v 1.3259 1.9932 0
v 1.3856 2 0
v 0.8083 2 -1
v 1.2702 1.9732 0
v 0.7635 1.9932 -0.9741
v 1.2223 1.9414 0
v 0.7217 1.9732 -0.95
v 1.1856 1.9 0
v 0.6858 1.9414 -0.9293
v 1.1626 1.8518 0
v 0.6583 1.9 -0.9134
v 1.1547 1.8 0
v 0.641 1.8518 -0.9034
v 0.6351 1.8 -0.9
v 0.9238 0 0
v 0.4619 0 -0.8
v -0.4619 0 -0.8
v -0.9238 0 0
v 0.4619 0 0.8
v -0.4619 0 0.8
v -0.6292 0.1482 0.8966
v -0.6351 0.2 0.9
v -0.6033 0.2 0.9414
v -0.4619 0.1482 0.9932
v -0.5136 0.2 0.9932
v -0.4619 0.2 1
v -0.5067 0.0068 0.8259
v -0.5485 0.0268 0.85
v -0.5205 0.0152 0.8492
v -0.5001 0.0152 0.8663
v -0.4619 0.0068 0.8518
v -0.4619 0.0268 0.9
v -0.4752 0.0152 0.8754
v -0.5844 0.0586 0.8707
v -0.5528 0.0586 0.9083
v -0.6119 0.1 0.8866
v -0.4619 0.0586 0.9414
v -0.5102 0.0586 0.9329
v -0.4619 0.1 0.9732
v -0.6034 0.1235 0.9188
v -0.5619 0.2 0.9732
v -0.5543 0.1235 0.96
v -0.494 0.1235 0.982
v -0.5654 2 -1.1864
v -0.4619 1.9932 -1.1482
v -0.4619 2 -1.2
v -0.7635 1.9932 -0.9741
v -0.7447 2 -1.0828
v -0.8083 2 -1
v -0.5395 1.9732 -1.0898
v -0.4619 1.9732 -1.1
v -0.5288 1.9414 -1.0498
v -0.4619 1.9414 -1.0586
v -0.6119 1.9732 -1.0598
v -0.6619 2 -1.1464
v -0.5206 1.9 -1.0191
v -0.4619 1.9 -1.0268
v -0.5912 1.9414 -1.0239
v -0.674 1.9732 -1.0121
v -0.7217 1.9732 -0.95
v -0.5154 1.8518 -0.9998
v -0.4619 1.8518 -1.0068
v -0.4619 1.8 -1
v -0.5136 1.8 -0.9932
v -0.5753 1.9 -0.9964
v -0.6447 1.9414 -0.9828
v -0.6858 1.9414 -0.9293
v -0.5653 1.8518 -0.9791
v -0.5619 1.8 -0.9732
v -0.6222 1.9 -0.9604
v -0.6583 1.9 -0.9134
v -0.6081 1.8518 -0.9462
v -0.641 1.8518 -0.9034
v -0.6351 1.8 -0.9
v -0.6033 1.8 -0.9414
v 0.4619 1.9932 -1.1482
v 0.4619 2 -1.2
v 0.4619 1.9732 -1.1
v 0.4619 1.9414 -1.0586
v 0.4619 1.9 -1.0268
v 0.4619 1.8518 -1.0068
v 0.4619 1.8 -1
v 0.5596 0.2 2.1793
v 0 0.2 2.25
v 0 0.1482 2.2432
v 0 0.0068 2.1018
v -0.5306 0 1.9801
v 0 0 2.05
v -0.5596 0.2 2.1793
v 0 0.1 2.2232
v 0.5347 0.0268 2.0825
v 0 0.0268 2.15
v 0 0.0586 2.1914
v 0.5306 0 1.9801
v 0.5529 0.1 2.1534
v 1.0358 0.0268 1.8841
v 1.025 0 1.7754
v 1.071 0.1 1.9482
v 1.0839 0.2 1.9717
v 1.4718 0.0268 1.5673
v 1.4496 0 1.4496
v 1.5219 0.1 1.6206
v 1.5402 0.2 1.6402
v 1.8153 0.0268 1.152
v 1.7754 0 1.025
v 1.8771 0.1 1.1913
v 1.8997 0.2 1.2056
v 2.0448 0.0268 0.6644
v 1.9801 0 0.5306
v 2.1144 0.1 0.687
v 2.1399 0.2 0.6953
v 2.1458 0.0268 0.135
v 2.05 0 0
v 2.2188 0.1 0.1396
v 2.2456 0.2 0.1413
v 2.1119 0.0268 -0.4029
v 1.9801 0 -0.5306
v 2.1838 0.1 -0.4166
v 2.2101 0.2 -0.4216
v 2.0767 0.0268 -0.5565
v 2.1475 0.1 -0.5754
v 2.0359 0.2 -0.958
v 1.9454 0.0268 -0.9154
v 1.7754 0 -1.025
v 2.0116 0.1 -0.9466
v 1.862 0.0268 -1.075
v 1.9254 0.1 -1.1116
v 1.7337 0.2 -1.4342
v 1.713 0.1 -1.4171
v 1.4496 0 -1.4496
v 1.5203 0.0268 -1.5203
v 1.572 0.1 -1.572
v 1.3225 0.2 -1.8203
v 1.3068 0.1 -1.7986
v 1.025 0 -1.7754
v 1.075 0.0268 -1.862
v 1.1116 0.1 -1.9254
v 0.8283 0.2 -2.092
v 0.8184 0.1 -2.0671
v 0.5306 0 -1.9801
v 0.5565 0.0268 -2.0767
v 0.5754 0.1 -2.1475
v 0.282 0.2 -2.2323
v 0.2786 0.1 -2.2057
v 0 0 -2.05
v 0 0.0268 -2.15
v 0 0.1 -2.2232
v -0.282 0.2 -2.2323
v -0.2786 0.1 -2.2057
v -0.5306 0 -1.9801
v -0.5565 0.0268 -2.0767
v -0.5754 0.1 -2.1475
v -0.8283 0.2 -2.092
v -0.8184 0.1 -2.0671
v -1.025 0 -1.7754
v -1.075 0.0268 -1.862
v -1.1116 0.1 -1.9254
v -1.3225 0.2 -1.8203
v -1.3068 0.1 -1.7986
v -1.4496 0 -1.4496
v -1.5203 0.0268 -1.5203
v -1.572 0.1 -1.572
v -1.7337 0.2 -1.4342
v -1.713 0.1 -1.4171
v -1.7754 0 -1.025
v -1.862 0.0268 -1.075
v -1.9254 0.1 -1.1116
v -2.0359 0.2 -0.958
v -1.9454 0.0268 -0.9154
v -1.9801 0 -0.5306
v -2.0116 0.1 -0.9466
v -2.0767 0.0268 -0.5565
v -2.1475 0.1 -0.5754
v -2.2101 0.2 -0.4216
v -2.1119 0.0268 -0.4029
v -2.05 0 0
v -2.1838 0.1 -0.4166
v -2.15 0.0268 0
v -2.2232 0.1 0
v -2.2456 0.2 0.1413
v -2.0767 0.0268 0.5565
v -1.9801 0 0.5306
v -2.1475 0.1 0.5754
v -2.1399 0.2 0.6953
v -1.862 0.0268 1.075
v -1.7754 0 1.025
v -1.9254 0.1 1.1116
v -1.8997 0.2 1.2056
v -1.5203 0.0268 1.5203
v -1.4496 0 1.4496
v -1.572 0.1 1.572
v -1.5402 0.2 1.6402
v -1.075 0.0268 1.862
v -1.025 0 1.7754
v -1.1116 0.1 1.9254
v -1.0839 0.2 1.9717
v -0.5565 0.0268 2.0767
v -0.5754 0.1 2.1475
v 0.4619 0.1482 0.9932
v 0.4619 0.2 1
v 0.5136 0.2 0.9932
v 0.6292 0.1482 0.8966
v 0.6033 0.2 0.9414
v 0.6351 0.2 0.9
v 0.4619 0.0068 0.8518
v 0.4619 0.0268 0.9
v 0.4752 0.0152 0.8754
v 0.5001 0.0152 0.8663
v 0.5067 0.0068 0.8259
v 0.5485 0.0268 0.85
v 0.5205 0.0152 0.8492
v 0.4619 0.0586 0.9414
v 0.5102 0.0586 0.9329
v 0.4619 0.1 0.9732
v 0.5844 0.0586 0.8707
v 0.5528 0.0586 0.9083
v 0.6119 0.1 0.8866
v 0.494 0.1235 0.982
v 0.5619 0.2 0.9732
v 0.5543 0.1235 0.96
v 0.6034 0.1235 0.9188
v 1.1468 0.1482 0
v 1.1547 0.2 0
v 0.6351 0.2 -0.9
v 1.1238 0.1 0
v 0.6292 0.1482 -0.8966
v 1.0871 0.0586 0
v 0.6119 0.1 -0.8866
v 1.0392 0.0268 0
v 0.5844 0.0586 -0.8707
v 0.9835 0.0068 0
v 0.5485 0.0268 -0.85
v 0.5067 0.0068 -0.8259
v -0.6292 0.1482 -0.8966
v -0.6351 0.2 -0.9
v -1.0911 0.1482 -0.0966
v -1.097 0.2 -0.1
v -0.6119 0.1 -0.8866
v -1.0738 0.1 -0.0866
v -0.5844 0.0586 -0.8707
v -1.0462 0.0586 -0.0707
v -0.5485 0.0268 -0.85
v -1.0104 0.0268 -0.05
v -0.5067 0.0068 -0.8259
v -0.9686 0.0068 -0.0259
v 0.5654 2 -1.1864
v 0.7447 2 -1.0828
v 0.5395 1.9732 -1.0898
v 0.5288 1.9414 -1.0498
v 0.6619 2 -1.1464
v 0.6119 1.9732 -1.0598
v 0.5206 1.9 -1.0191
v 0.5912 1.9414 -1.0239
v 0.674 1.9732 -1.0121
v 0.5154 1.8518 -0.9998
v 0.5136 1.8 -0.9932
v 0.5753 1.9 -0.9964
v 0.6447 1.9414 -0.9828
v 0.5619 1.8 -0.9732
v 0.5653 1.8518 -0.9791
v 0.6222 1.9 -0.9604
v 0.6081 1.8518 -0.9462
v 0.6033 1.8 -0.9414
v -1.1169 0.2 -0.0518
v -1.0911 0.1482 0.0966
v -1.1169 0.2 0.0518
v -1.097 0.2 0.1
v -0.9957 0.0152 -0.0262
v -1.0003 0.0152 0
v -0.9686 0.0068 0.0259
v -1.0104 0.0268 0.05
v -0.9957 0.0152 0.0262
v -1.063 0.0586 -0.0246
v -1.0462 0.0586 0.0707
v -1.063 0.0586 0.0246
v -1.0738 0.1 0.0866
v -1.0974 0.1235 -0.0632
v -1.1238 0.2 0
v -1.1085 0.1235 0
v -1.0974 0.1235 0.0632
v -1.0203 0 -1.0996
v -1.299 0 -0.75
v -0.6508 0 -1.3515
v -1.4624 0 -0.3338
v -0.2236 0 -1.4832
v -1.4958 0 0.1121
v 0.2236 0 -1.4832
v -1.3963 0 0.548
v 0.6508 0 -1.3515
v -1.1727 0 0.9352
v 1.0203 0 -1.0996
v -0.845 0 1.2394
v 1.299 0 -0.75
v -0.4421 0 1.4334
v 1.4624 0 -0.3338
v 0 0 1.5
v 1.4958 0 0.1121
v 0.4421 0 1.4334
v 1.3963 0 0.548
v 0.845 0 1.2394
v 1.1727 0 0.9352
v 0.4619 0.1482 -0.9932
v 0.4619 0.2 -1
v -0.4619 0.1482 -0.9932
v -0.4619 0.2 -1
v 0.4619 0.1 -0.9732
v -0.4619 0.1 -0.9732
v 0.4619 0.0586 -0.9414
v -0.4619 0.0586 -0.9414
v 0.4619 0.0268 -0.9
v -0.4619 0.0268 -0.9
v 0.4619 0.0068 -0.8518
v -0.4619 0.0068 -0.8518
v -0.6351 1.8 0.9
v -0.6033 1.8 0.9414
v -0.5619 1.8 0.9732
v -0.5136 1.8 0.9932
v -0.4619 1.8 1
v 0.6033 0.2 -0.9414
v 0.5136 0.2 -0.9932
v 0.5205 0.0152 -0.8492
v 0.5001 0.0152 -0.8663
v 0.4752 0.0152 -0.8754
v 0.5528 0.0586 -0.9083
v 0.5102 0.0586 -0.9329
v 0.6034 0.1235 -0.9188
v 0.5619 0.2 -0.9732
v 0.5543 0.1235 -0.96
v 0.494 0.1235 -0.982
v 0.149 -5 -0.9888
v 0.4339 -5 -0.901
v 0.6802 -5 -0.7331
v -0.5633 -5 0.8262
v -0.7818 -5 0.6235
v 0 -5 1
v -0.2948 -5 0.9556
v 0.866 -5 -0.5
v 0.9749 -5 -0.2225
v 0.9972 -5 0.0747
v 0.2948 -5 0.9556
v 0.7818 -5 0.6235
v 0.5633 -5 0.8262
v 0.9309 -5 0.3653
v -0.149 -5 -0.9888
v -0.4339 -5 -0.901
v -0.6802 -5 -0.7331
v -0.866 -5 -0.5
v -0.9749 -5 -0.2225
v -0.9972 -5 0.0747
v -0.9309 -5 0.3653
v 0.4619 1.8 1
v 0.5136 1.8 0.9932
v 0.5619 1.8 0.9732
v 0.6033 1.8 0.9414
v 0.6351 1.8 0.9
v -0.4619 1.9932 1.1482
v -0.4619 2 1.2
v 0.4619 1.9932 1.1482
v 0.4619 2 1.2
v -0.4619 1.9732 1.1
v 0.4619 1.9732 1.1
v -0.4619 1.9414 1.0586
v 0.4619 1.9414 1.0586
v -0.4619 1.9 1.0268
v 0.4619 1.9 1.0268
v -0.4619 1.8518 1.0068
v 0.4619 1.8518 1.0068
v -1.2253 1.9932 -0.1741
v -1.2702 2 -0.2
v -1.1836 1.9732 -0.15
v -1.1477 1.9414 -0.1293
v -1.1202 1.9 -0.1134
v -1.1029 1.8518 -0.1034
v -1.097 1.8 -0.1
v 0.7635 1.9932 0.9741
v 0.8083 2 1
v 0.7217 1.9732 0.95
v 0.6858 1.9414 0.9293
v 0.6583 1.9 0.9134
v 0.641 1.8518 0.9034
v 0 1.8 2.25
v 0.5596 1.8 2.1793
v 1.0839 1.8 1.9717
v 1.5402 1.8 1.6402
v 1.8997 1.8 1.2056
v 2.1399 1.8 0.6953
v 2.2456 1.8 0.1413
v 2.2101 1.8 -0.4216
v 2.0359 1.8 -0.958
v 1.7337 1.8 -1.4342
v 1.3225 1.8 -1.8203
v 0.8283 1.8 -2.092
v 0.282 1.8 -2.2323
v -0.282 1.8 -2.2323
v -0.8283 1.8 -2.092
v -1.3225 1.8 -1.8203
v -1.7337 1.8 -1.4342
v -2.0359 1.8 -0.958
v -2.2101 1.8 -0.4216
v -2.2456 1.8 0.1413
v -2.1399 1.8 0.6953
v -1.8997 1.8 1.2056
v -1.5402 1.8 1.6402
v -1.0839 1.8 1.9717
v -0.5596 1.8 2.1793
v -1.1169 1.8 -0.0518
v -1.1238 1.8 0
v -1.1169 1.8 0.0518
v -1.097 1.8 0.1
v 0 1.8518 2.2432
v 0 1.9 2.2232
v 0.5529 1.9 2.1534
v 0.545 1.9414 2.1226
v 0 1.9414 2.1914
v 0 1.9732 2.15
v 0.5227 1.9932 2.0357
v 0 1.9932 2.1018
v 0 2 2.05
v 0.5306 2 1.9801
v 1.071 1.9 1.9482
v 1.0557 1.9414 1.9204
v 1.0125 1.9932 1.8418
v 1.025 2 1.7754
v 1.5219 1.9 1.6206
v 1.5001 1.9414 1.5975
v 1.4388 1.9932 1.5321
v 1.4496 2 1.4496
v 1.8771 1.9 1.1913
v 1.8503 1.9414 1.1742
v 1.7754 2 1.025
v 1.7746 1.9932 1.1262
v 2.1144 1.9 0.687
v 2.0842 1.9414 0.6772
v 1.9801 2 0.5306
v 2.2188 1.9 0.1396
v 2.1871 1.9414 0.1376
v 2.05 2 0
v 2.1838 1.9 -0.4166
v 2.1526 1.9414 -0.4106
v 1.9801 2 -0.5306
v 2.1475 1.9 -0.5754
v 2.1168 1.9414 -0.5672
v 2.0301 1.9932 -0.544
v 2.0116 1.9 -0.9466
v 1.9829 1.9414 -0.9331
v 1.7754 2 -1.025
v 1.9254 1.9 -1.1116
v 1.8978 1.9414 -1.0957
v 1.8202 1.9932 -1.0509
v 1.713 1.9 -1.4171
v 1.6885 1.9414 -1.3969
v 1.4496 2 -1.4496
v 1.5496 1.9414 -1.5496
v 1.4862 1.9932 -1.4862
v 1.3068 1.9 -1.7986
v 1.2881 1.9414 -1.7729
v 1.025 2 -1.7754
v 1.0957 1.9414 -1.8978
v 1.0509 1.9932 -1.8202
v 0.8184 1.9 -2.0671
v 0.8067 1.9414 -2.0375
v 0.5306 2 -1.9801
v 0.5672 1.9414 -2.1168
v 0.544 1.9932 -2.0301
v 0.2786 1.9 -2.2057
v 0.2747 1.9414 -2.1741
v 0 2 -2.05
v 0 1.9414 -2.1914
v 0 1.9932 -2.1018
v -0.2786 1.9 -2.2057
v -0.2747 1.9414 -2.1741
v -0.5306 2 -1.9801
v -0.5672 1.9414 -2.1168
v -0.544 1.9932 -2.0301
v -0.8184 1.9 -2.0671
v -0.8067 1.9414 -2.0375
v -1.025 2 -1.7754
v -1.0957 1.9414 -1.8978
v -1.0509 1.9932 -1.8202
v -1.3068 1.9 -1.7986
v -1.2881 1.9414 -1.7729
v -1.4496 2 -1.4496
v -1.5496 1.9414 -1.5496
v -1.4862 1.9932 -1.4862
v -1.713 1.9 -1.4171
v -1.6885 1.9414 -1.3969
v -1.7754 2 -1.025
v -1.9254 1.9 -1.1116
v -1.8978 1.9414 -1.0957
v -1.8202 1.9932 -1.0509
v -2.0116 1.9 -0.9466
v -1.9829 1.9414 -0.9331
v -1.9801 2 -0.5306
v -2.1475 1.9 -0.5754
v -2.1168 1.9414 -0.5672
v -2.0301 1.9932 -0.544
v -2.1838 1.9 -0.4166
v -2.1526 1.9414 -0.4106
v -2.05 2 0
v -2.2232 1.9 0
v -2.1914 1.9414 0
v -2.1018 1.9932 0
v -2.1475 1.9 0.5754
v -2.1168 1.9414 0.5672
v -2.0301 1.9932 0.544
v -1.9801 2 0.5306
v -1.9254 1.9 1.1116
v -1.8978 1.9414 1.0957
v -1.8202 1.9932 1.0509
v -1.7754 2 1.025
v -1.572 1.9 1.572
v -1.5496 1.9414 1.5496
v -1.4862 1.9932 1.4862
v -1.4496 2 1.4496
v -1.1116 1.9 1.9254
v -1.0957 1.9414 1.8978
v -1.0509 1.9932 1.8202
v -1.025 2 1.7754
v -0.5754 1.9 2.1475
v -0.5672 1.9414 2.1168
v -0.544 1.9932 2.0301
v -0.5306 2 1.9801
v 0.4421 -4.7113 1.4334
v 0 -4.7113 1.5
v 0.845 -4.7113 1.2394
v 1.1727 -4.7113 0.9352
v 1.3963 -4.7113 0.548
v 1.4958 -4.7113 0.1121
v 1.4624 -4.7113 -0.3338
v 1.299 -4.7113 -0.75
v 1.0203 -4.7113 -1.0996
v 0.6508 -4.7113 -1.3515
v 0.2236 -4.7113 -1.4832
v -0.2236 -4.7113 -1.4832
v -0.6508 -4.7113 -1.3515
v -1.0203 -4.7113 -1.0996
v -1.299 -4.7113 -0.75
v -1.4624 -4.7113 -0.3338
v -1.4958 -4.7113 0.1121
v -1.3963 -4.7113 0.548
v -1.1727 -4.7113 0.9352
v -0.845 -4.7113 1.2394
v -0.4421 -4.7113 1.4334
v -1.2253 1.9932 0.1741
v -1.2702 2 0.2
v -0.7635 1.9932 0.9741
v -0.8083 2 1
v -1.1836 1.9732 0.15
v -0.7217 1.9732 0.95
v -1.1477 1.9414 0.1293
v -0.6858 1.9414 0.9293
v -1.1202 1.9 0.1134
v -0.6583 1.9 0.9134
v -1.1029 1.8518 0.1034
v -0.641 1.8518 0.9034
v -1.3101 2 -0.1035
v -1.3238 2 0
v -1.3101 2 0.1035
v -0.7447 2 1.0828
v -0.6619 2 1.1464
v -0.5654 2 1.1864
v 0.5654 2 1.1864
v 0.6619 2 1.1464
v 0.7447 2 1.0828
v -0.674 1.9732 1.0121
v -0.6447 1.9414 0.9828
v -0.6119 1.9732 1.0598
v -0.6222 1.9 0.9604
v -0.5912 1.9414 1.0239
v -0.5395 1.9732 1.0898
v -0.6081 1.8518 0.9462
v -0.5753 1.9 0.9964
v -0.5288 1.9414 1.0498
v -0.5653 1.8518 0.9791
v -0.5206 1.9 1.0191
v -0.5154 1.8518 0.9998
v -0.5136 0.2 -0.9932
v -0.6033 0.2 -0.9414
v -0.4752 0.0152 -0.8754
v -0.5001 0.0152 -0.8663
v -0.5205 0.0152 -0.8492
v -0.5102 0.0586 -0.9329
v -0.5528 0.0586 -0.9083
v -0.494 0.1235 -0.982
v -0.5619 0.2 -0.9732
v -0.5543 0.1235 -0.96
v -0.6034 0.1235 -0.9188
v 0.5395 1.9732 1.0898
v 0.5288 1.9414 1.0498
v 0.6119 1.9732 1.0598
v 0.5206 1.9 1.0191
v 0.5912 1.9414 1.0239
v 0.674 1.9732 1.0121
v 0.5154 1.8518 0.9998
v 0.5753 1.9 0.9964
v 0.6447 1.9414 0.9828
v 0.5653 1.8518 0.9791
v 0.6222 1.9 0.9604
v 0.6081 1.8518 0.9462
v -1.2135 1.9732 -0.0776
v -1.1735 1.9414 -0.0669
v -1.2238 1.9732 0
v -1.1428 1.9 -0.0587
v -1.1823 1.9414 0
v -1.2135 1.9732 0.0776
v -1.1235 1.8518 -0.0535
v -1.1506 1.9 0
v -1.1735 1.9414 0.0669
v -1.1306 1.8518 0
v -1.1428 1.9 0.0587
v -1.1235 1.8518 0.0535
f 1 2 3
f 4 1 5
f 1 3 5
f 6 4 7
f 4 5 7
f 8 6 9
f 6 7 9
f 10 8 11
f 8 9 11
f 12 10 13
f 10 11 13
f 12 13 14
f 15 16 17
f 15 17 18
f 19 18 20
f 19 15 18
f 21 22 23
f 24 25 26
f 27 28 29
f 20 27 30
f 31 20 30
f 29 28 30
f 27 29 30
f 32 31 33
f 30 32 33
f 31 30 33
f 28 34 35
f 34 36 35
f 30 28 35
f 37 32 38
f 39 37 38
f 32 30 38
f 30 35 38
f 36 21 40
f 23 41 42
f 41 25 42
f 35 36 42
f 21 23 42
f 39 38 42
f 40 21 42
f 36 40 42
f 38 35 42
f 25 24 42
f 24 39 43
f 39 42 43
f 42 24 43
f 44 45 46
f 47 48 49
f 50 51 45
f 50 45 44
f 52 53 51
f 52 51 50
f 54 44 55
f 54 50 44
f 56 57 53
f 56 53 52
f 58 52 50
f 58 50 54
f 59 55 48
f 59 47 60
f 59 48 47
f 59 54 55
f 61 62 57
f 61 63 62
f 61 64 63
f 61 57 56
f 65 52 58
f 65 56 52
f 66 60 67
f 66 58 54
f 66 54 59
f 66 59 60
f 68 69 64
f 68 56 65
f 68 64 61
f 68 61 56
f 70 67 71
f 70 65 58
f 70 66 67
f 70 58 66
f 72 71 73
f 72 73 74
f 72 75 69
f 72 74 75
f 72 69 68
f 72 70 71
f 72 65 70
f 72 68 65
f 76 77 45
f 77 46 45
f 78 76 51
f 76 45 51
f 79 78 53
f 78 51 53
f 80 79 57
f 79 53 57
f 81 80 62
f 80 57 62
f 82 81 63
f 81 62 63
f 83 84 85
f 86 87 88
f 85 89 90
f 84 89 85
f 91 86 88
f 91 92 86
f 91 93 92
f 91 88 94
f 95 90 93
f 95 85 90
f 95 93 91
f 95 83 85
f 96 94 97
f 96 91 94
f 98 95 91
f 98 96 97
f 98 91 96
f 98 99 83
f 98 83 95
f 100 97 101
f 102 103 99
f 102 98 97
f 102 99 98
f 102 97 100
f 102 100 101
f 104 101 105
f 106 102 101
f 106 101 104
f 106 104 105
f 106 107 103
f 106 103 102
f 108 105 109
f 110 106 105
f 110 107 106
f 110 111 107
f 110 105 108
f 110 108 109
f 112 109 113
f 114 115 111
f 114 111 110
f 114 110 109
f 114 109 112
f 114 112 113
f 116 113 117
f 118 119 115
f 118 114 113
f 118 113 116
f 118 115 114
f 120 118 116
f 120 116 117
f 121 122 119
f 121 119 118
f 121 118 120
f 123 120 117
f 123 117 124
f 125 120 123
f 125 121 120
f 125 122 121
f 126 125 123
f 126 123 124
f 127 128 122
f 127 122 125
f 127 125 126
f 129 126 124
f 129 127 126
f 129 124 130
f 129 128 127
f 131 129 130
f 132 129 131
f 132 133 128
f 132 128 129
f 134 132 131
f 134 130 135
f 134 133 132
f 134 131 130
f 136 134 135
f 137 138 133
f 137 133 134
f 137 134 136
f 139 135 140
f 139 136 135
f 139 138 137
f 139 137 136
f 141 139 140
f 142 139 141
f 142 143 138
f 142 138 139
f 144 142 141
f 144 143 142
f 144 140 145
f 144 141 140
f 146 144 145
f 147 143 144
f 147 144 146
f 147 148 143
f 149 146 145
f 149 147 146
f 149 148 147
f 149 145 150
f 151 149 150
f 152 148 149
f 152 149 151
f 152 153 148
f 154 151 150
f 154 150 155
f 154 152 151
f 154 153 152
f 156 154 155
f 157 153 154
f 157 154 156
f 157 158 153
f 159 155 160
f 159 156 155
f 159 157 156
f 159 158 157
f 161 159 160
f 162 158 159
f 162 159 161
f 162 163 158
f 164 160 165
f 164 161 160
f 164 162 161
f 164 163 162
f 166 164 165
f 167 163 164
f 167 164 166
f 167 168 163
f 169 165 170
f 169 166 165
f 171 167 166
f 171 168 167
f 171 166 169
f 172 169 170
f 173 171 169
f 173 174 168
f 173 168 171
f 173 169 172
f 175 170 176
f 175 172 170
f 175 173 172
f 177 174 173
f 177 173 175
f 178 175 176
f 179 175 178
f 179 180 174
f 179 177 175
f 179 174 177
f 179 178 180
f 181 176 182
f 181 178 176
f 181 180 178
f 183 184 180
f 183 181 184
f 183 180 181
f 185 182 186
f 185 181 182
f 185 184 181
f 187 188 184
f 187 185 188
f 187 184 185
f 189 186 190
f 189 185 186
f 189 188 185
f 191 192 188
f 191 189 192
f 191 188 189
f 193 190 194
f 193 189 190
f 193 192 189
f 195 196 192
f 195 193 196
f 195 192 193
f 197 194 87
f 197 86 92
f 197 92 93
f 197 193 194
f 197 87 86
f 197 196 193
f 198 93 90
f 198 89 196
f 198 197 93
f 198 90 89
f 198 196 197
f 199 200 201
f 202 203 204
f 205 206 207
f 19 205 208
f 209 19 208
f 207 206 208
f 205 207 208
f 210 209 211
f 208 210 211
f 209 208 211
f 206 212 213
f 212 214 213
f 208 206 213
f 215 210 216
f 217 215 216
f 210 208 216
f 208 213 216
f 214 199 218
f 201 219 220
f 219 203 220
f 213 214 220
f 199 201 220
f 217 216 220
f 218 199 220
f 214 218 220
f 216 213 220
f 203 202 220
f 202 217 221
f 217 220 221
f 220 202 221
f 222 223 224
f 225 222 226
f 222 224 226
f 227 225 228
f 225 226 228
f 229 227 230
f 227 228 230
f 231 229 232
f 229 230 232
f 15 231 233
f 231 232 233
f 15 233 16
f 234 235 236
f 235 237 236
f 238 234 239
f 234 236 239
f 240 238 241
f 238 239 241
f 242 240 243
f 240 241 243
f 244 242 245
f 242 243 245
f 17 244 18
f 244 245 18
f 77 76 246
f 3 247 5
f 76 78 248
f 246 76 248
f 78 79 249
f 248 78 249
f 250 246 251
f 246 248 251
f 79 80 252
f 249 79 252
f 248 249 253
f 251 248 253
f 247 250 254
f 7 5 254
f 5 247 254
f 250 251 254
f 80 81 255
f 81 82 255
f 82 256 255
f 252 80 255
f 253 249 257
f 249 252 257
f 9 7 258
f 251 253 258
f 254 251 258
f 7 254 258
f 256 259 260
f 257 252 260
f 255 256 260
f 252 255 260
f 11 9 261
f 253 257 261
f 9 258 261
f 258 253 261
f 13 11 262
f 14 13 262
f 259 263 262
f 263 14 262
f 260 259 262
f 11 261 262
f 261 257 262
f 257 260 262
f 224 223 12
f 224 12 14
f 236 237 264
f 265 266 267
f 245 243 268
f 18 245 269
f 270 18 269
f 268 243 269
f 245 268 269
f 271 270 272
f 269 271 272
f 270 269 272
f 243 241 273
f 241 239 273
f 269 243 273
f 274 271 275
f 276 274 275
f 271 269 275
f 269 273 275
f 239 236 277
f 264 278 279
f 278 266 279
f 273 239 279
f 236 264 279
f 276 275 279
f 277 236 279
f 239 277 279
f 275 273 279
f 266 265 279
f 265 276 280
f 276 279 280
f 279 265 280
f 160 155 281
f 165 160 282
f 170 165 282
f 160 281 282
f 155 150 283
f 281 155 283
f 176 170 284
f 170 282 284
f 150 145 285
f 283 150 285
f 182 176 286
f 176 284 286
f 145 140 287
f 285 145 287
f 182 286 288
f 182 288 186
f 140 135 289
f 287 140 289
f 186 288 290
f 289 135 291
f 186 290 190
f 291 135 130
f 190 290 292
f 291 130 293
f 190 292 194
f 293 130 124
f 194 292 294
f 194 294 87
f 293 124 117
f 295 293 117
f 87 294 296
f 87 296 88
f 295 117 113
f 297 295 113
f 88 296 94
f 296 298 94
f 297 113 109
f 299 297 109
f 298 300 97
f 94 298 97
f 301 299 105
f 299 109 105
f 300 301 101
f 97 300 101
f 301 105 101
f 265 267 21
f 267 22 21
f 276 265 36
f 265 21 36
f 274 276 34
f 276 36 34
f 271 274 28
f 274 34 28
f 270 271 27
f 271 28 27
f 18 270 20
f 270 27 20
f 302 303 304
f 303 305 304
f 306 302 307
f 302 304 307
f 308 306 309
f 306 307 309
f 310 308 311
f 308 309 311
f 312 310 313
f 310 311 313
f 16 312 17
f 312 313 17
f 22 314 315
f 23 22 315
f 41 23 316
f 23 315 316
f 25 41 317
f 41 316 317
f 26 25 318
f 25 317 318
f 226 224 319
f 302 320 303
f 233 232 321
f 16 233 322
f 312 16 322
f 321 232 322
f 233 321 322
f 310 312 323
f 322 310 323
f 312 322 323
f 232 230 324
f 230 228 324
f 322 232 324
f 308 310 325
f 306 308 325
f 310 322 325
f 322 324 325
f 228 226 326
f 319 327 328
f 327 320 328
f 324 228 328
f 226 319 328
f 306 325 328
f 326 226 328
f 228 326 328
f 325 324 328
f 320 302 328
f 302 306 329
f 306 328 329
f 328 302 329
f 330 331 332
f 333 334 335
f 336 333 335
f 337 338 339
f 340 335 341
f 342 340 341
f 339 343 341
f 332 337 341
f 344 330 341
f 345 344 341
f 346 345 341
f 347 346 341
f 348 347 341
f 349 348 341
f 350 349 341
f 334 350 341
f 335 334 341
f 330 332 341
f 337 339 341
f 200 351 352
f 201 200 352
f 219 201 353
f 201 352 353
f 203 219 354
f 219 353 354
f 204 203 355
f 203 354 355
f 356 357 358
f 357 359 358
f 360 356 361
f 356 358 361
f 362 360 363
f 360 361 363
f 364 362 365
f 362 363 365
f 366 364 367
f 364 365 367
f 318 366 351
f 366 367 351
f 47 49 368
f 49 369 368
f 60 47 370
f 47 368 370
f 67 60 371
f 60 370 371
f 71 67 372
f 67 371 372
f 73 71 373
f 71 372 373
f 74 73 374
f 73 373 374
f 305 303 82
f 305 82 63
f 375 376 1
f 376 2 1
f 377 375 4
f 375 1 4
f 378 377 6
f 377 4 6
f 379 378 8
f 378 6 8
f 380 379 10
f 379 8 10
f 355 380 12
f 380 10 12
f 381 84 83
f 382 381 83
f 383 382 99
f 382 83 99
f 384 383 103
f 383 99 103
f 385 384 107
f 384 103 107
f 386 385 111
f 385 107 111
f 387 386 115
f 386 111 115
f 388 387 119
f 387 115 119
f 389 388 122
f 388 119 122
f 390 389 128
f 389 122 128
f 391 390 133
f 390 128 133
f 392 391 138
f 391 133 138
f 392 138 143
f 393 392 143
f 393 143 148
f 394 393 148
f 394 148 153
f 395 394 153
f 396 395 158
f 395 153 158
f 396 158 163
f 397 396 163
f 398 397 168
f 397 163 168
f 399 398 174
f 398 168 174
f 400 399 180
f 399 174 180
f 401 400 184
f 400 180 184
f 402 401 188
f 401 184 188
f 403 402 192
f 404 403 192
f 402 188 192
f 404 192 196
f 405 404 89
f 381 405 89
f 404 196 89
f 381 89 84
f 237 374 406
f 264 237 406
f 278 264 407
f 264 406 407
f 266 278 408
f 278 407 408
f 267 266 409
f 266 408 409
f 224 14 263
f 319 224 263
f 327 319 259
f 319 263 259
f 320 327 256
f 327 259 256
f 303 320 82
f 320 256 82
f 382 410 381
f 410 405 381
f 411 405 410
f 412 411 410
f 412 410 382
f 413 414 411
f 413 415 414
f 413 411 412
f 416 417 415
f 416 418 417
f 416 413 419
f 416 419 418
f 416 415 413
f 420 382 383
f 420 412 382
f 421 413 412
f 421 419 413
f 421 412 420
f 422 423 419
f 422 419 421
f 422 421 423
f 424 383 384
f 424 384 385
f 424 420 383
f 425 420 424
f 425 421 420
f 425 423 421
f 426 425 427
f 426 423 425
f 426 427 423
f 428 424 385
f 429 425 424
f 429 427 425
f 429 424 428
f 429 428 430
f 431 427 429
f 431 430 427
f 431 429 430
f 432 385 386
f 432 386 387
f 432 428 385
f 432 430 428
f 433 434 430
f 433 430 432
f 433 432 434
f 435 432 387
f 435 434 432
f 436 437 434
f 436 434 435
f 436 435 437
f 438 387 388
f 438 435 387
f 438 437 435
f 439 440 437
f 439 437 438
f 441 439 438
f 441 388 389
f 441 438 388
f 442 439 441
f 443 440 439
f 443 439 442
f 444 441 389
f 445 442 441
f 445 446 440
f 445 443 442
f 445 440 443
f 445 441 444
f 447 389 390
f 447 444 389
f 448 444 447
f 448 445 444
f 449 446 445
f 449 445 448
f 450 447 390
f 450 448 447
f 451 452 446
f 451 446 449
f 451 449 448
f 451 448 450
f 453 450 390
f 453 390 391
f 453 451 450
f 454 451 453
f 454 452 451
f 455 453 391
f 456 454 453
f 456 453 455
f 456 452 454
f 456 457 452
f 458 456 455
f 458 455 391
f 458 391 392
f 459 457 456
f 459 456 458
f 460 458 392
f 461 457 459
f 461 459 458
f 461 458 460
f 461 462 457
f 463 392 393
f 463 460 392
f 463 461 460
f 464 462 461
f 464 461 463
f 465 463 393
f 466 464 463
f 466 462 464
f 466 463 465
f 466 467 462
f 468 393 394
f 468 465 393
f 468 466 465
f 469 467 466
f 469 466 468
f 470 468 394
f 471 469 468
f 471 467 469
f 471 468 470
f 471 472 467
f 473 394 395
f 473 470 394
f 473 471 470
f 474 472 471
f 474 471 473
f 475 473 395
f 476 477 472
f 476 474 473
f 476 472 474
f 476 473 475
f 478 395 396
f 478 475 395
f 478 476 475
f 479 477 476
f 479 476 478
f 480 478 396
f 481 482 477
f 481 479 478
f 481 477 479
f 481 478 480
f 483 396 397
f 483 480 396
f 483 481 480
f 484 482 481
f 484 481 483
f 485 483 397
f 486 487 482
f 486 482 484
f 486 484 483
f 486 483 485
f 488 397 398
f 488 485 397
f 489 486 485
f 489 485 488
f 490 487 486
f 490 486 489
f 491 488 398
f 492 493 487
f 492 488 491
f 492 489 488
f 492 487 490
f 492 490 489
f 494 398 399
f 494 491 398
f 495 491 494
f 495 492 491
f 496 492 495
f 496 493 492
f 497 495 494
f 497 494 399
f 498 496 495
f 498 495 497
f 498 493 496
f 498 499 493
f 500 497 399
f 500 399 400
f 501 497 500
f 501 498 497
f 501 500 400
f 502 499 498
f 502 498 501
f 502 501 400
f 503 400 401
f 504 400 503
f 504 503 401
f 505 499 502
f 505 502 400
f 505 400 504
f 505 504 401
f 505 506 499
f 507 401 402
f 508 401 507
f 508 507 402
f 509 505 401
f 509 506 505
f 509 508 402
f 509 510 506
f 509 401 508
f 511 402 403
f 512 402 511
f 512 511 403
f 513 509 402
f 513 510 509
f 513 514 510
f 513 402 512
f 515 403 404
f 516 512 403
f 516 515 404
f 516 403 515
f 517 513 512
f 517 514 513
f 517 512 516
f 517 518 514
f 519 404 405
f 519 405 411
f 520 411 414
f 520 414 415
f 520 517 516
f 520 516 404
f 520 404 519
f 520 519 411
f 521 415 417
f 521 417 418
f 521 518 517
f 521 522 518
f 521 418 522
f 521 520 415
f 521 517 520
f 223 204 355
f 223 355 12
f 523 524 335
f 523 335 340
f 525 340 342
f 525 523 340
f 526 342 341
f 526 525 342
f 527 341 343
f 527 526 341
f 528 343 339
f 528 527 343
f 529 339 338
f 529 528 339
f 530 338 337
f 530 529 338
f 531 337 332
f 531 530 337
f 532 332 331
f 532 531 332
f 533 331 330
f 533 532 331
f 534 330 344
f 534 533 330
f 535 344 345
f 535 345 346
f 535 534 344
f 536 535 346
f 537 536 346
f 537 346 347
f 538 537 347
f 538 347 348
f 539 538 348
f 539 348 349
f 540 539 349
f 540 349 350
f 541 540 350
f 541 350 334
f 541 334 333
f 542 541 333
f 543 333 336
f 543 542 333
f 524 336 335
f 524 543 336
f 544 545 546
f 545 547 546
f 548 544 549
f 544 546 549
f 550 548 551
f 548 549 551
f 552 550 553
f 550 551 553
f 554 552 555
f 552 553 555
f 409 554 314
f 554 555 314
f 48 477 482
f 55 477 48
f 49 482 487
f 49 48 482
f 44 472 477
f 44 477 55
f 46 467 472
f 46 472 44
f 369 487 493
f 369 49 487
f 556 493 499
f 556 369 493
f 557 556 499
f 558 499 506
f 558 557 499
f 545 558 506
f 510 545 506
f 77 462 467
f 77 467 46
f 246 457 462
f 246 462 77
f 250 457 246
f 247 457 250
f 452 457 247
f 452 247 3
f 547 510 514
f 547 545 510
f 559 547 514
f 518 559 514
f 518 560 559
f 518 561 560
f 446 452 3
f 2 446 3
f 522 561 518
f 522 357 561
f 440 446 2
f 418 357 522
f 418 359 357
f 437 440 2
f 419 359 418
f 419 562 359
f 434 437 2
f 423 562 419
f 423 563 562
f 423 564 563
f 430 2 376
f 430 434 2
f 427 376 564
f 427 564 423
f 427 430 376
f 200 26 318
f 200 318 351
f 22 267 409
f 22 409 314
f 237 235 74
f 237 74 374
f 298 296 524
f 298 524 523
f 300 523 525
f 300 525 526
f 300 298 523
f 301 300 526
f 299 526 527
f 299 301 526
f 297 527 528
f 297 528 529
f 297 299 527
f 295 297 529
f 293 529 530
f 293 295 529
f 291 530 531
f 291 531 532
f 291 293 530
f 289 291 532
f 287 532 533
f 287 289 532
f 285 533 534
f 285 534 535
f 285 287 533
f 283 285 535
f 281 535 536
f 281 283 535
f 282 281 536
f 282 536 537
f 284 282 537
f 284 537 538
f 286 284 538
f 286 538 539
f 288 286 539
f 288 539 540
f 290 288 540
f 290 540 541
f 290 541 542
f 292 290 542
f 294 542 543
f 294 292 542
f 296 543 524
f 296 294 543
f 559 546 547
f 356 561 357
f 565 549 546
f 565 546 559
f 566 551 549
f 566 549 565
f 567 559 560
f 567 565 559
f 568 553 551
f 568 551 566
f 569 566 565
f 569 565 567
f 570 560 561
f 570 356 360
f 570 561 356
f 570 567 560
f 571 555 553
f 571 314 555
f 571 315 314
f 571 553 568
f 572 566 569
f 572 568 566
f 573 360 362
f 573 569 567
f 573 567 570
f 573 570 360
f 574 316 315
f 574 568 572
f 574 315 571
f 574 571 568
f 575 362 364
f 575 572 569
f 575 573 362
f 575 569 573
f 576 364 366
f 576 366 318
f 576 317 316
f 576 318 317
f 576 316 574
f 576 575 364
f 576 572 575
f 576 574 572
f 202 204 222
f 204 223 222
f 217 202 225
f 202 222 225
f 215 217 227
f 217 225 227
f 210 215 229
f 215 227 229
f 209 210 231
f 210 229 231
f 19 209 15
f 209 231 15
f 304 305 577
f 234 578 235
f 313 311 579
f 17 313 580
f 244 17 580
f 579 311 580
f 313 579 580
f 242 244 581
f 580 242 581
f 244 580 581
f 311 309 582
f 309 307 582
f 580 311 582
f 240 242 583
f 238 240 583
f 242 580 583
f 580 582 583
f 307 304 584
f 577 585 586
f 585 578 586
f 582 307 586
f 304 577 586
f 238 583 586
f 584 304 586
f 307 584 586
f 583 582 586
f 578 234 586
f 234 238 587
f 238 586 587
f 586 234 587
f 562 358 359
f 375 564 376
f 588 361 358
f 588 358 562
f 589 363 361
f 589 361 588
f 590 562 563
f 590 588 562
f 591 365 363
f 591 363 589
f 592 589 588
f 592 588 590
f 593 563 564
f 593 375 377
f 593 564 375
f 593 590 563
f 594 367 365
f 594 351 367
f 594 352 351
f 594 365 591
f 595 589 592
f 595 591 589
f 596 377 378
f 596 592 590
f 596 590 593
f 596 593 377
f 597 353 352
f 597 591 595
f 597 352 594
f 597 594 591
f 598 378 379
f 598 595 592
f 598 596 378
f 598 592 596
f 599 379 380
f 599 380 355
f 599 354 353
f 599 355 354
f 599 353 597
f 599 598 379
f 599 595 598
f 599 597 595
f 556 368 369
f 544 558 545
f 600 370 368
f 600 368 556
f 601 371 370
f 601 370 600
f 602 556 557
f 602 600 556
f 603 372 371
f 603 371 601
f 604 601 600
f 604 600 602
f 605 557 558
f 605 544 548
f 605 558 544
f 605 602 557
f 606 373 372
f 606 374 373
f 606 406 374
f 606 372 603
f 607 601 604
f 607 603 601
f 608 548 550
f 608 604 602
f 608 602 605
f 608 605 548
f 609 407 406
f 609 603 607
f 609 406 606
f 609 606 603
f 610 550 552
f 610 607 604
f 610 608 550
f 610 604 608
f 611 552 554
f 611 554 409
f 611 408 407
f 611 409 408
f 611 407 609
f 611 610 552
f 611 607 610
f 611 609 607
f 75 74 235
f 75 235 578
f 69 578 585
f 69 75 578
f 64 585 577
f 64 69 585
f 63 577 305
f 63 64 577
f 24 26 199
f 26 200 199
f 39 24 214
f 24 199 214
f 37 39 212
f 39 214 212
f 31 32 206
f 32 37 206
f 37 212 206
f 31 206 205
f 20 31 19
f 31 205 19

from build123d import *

# Parameters (mm, degrees)
HEAD_SKETCH_R                  = 2.25
HEAD_DEPTH                     = 2
THREADED_SECTION_STUB_SKETCH_R = 1.5
BOSS_EXTRUDE2_DEPTH            = 5
END_OF_BOLT_CHAMFER_SIZE       = 0.5
END_OF_BOLT_CHAMFER_SIZE2      = 0.288675135
COSMETIC_FILLETS_R             = 0.2


with BuildPart() as part:
    # Head Sketch → Head (new body)
    with BuildSketch(Plane(origin=(0, 0, 0), x_dir=(1, 0, 0), z_dir=(0, 1, 0))):
        with Locations(Location((0, 0, 0), (0, 0, 270))):
            Circle(HEAD_SKETCH_R)
        Polygon((-0.577350269, 1), (-1.154700538, 0), (-0.577350269, -1), (0.577350269, -1), (1.154700538, 0), (0.577350269, 1), align=None, mode=Mode.SUBTRACT)
    extrude(amount=HEAD_DEPTH)

    # Threaded Section Stub Sketch → Boss-Extrude2 (add)
    with BuildSketch(Plane(origin=(0, 0, 0), x_dir=(1, 0, 0), z_dir=(0, 1, 0))):
        with Locations(Location((0, 0, 0), (0, 0, 270))):
            Circle(THREADED_SECTION_STUB_SKETCH_R)
    extrude(amount=-BOSS_EXTRUDE2_DEPTH)

    # End Of Bolt chamfer
    end_of_bolt_chamfer_edges = [part.edges().sort_by_distance(p)[0] for p in [
        (0, -5, -1.5),
    ]]
    end_of_bolt_chamfer_side = [part.faces().sort_by_distance(p)[0] for p in [
        (0, -5, 0),
    ]]
    chamfer(end_of_bolt_chamfer_edges, length=END_OF_BOLT_CHAMFER_SIZE, length2=END_OF_BOLT_CHAMFER_SIZE2, reference=end_of_bolt_chamfer_side[0])

    # Cosmetic Fillets
    cosmetic_fillets_edges = [part.edges().sort_by_distance(p)[0] for p in [
        (-0.577350269, 1, -1),
        (-0.8660254037844384, 0, 0.5000000000000003),
        (-1.154700538, 1, 0),
        (0, 0, 1),
        (-0.577350269, 1, 1),
        (0.8660254037844388, 0, 0.4999999999999998),
        (0.577350269, 1, 1),
        (0.8660254037844388, 0, -0.5000000000000002),
        (0, 2, -1),
        (-0.866025404, 2, -0.5),
        (-0.866025404, 2, 0.5),
        (0, 2, 1),
        (0.866025404, 2, 0.5),
        (0.866025404, 2, -0.5),
        (0, 0, -2.25),
        (0, 2, -2.25),
        (0, 0, -1),
        (0.577350269, 1, -1),
        (-0.8660254037844386, 0, -0.4999999999999998),
    ]]
    fillet(cosmetic_fillets_edges, radius=COSMETIC_FILLETS_R)


solid = part.part
